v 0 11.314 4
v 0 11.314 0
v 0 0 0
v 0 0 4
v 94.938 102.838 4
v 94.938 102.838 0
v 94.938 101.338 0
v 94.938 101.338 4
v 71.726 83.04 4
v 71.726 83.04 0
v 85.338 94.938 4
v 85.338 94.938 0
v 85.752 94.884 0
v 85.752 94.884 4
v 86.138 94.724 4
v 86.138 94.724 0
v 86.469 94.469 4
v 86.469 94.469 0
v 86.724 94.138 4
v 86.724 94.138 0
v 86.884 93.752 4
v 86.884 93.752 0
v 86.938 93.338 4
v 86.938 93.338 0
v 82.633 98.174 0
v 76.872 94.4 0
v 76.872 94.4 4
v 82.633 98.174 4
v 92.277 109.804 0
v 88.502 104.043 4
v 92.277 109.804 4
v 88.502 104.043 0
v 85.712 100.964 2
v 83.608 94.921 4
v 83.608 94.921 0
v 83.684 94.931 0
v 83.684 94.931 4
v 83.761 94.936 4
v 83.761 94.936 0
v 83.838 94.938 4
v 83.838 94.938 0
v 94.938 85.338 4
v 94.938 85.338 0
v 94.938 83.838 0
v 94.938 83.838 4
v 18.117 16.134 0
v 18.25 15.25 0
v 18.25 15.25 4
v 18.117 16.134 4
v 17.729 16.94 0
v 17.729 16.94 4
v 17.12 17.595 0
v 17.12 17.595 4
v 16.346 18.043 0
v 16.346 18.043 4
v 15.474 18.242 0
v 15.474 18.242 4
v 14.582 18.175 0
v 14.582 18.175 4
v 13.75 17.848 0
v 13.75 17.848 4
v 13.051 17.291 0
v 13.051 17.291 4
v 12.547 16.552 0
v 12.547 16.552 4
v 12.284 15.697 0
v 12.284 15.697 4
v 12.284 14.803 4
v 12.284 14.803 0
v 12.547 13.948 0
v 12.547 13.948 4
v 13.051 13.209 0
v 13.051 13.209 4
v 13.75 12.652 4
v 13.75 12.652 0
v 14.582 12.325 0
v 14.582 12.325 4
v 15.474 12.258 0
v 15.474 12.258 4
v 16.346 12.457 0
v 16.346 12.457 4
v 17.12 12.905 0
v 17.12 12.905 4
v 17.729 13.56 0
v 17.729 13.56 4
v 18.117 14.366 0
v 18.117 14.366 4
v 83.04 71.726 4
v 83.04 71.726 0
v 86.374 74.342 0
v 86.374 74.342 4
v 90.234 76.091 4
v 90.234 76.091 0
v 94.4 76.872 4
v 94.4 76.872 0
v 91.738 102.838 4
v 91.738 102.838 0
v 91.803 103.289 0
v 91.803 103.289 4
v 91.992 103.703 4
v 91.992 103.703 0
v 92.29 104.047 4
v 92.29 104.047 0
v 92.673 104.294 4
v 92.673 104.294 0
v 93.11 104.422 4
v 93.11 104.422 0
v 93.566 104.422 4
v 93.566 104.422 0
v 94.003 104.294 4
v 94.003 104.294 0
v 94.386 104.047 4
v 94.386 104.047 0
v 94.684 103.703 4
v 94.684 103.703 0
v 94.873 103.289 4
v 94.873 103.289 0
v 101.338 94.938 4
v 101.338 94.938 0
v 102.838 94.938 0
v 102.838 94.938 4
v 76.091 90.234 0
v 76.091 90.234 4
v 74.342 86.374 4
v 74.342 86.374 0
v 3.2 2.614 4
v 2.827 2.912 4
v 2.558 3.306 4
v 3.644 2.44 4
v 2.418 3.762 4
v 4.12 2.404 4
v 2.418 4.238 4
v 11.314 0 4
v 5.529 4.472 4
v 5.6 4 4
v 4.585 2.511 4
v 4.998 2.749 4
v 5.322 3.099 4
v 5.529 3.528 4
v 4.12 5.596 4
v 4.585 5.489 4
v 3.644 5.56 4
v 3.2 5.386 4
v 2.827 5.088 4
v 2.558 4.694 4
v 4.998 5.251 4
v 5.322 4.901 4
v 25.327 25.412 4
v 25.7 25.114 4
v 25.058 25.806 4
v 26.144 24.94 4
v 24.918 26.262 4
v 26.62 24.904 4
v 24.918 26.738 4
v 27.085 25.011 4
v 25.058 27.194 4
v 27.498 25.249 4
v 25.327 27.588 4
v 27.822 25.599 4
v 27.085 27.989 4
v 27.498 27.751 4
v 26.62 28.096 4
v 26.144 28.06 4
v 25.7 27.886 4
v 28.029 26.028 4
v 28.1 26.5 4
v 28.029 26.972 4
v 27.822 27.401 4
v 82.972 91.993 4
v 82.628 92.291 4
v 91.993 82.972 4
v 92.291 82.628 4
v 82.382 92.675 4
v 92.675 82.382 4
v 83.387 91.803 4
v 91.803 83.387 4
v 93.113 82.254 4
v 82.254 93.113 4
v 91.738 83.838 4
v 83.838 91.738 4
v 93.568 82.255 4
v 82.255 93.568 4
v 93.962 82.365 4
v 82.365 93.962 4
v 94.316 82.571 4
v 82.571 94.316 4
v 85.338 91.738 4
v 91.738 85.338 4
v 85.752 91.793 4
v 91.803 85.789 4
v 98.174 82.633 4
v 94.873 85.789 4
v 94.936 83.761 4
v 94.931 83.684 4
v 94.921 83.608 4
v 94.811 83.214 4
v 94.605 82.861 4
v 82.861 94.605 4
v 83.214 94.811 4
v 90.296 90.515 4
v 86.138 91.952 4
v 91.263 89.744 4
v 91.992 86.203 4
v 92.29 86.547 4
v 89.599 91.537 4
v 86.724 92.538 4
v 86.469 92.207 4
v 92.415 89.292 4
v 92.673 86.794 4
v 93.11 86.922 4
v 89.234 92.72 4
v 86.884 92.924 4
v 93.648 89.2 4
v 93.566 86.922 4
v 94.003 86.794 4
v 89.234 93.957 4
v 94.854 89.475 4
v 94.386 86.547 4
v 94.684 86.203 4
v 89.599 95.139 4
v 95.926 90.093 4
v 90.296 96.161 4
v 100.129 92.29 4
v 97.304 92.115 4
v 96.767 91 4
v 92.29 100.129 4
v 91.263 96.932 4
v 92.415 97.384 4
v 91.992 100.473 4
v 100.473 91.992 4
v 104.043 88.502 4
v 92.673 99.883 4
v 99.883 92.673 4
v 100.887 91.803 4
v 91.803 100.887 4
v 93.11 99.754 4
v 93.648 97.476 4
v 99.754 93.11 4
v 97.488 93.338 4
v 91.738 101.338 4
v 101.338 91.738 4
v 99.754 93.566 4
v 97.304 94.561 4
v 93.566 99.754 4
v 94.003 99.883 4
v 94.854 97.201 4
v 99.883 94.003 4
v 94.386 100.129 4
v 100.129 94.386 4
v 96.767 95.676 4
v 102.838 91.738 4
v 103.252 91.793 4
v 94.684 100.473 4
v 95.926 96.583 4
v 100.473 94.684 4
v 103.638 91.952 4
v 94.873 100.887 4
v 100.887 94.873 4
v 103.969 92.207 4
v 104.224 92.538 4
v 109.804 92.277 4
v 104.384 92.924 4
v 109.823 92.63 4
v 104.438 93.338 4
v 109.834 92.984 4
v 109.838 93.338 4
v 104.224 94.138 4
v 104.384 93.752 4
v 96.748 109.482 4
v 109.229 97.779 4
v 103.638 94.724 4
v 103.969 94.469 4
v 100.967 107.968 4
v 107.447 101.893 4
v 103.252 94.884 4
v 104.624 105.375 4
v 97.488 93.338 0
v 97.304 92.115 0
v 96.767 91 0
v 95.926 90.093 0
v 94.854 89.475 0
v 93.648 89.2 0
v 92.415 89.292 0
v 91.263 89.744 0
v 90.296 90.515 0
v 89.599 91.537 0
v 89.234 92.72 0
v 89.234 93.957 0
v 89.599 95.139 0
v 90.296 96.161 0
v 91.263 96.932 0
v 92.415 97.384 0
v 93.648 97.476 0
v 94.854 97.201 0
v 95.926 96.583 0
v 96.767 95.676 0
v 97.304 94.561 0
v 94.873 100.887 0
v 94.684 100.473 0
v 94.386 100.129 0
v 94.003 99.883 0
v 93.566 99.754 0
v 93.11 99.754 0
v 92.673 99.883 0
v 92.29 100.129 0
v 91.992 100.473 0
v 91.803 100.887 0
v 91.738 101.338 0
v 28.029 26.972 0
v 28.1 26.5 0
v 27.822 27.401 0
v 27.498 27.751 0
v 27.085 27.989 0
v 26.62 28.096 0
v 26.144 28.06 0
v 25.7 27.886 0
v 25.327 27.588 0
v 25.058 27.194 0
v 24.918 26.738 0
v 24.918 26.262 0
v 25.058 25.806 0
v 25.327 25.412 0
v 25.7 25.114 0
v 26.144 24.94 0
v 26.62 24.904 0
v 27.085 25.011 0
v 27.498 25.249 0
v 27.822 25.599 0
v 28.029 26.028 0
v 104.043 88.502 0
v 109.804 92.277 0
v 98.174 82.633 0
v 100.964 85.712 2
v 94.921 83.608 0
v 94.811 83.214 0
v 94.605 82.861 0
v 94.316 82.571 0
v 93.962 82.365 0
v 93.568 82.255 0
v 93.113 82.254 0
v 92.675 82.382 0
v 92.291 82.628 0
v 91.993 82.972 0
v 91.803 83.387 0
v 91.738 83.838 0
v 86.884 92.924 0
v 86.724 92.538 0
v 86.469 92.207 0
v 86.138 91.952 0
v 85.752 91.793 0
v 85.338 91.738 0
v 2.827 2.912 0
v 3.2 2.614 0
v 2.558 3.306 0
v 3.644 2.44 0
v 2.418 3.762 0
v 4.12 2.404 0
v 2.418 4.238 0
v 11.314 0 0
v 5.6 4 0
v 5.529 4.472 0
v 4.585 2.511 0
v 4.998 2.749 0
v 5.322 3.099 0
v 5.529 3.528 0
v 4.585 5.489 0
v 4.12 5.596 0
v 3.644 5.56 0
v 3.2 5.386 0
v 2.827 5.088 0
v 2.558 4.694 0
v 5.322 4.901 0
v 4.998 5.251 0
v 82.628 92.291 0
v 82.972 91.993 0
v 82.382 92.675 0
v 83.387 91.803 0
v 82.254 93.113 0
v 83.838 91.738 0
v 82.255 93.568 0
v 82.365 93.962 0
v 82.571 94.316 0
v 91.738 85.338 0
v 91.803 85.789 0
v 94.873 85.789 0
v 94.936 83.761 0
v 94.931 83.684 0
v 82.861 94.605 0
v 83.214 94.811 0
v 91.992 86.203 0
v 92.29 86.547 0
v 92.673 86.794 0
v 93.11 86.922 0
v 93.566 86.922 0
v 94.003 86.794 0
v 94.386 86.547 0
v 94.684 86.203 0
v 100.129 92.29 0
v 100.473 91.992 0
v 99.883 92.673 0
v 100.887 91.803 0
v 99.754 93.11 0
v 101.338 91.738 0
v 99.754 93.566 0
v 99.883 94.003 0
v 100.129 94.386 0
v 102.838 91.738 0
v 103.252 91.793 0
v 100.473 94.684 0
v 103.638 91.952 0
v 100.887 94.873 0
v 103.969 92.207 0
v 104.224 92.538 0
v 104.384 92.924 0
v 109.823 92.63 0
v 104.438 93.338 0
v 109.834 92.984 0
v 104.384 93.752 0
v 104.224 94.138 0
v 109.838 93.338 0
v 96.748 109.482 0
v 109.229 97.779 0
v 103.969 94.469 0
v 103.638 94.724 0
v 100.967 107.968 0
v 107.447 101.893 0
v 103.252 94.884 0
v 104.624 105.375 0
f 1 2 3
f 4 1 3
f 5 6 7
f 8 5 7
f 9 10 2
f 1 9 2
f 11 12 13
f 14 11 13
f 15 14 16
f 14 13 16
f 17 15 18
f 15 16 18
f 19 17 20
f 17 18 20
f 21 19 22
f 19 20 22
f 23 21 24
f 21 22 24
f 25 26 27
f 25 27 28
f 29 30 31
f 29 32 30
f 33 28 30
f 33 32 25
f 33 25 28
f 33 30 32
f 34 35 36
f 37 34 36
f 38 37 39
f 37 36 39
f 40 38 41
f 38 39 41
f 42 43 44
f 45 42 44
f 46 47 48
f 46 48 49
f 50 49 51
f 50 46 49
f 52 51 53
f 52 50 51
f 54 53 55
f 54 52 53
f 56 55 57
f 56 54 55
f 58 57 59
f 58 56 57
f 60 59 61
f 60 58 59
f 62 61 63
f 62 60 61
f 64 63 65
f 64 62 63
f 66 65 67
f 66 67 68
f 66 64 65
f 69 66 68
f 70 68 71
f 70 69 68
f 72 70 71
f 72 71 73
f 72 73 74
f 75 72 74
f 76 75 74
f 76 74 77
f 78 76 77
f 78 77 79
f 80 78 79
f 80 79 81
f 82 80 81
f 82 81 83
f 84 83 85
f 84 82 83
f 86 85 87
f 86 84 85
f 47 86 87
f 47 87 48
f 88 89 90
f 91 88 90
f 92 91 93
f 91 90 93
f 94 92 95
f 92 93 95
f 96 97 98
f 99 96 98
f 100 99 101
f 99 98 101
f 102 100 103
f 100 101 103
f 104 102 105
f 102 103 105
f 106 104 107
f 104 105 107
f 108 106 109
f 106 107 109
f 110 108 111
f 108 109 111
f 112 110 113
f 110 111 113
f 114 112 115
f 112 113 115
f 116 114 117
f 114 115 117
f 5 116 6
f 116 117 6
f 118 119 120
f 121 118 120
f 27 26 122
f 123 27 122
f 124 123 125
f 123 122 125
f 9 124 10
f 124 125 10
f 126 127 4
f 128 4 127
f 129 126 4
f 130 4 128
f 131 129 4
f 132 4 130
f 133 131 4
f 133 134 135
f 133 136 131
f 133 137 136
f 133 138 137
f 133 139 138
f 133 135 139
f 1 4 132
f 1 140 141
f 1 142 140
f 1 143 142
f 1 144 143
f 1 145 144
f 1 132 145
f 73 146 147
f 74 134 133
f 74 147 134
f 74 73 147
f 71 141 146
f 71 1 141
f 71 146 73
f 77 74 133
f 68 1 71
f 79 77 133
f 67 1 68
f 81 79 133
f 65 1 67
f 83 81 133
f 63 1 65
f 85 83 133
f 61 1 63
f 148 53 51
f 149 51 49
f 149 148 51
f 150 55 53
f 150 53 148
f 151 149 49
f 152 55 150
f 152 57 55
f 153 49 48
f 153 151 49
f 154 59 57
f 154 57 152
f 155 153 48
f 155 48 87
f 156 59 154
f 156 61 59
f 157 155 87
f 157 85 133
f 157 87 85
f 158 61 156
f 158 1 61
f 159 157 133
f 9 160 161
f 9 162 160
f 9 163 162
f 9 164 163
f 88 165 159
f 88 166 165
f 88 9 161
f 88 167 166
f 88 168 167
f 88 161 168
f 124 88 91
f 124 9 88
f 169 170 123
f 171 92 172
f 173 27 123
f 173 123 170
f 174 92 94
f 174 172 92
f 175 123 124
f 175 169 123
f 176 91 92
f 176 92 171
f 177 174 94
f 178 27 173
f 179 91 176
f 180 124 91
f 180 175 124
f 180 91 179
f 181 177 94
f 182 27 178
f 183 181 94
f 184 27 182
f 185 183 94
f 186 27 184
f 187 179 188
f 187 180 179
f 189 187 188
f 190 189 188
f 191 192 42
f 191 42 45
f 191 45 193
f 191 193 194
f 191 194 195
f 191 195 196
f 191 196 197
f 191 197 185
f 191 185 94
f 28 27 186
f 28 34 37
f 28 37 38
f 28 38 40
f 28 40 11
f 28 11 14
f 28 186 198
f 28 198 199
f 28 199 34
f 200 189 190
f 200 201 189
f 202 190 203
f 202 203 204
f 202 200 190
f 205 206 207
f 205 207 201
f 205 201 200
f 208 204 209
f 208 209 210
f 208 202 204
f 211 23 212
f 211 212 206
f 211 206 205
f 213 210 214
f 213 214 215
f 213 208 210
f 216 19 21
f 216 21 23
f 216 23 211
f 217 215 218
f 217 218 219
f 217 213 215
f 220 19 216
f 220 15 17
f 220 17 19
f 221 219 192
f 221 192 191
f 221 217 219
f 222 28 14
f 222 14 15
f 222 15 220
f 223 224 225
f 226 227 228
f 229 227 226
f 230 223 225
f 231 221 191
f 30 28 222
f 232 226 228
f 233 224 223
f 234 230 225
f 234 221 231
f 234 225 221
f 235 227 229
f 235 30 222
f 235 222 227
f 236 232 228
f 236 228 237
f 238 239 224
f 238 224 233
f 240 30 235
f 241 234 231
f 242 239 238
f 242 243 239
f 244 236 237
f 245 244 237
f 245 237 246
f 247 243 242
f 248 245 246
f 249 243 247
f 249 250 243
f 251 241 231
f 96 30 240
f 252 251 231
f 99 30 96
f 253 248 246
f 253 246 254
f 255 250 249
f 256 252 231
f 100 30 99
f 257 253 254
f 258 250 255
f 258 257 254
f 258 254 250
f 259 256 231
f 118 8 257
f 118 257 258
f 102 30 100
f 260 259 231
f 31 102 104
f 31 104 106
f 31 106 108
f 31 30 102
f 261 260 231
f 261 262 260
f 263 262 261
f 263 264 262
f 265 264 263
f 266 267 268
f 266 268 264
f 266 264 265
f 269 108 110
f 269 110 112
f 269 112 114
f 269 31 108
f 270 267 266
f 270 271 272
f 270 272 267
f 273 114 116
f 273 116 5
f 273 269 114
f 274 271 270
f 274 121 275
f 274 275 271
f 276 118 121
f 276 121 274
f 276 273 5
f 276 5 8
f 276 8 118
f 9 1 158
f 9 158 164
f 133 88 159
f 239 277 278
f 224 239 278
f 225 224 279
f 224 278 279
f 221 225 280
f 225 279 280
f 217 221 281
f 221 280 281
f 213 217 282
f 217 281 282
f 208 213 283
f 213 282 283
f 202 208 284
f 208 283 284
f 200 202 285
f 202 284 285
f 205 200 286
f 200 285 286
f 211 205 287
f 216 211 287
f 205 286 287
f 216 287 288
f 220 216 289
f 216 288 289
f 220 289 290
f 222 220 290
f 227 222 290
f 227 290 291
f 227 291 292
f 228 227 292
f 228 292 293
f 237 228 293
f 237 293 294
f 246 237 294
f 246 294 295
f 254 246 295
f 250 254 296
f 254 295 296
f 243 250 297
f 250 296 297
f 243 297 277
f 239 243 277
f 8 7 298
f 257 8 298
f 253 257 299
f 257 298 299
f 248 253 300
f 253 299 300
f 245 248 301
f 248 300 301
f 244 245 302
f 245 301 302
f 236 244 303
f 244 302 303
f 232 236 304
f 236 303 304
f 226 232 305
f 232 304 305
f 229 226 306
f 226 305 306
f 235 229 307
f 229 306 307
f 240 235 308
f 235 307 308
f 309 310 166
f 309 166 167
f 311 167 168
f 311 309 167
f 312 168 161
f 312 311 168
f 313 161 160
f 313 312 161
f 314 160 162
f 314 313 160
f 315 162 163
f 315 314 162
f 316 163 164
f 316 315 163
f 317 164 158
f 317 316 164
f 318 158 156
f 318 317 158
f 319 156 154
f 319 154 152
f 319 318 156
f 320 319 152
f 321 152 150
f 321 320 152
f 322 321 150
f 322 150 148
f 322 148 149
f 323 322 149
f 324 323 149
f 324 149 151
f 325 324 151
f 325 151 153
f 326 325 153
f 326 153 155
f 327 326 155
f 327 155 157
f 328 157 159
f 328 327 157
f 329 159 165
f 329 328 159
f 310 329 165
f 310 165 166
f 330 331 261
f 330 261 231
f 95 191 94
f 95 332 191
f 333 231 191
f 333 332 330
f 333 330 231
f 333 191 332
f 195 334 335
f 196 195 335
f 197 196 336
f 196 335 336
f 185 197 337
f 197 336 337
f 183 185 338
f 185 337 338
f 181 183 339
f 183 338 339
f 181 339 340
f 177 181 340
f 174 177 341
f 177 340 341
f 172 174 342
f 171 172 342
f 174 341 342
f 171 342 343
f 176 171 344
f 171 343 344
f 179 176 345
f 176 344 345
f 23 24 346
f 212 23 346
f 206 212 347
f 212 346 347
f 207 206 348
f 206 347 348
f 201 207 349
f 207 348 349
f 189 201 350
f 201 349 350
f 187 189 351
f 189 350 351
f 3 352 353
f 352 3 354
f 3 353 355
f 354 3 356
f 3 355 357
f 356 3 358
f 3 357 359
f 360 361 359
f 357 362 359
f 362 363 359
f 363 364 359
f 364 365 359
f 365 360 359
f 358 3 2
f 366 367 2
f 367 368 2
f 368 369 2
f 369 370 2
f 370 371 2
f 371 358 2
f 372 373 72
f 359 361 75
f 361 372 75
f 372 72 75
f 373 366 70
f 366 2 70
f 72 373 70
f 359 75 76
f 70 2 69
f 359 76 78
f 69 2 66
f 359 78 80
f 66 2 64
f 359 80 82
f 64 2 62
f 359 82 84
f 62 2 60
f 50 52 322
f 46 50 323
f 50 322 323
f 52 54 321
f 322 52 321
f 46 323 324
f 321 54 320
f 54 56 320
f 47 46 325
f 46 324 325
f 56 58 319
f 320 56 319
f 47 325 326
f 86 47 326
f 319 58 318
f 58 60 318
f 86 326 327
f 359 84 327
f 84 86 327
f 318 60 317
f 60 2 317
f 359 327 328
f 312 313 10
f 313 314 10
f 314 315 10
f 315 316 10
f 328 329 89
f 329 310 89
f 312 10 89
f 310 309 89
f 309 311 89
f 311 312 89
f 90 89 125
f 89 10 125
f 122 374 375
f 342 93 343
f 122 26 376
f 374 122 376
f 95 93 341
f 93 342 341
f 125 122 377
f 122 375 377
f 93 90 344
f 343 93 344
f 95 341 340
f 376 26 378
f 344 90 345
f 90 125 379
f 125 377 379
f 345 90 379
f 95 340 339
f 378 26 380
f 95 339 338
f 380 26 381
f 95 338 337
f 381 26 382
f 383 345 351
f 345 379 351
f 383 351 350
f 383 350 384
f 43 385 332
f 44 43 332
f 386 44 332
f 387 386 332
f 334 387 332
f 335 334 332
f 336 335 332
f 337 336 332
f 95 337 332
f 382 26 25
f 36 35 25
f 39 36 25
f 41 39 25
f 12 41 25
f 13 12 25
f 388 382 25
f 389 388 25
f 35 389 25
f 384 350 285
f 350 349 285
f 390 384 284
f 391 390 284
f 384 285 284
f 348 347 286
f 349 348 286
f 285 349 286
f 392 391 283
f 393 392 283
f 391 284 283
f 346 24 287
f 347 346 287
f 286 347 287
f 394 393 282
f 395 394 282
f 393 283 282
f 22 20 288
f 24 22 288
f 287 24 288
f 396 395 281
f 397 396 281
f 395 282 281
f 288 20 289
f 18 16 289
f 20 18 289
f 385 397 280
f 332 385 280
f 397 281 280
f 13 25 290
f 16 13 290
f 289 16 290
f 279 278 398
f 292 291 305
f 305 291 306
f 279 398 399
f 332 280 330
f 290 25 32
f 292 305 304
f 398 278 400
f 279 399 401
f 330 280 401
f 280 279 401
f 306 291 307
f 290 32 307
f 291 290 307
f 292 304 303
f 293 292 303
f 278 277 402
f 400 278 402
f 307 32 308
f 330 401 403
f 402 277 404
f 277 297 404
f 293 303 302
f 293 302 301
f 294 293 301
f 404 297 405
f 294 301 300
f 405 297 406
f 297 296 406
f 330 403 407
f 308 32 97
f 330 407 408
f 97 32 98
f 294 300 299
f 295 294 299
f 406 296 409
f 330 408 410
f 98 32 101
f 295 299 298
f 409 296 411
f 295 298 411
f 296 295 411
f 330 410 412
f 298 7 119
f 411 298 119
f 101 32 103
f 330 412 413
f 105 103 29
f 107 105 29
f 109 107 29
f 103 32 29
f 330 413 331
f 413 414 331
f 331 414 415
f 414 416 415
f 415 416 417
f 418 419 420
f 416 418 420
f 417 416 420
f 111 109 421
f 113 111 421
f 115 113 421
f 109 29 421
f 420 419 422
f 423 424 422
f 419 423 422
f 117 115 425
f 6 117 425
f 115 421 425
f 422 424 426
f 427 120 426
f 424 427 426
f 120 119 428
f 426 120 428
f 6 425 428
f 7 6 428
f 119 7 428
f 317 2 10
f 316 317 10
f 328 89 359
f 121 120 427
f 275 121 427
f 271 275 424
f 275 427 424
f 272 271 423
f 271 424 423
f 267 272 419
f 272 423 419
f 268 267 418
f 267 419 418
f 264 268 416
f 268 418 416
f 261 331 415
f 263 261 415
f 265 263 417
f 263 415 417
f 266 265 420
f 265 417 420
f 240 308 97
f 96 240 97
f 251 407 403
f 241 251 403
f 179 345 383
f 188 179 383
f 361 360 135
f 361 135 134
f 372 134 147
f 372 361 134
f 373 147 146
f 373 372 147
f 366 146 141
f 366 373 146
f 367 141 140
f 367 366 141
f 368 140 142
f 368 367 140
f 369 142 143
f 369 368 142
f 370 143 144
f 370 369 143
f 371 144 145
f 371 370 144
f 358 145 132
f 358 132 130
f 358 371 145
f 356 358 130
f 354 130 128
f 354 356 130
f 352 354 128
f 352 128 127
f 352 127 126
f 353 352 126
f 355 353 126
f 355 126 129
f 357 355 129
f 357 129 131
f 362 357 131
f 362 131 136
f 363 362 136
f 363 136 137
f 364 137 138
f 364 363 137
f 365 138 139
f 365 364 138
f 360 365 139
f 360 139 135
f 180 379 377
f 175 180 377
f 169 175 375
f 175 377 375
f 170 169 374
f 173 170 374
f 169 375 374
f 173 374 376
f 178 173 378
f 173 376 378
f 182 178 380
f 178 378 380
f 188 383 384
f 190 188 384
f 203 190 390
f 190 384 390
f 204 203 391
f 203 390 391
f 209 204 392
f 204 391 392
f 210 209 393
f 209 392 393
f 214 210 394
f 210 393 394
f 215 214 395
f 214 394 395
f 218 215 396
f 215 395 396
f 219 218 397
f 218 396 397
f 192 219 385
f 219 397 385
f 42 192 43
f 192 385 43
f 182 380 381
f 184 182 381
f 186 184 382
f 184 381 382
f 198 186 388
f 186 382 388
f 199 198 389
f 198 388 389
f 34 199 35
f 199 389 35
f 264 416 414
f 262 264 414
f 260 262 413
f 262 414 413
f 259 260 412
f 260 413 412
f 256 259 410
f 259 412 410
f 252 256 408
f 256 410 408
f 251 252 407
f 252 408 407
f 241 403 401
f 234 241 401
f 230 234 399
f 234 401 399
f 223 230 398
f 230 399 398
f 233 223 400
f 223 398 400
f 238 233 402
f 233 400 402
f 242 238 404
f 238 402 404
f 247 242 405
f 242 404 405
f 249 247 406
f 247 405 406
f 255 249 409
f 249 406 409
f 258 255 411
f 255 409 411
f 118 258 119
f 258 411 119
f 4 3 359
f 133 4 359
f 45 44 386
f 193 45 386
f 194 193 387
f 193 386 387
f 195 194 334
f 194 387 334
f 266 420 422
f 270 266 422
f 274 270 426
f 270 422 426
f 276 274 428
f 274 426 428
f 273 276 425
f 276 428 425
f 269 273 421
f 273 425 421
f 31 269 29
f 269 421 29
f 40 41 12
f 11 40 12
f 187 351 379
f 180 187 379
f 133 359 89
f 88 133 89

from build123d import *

# Parameters (mm, degrees)
F0_R        = 1.6
F0_R_2      = 3
F1_DEPTH    = 4
F2_T1_DEPTH = 4


# Not quite as in the source:
# - a fillet or chamfer that OpenCascade refuses, or shapes differently, is made with other operations: its cross-section is extruded or revolved along the edge and cut away or added


with BuildPart() as f1:
    # F0 (on Top) → F1 (new body)
    with BuildSketch(Plane.XY):
        with BuildLine():
            ThreePointArc((88.7907835501, 77.4770750512), (81.670833227, 81.670833227), (77.4770750512, 88.7907835501))
            Line((77.4770750512, 88.7907835501), (0, 11.313708499))
            Line((0, 11.313708499), (0, 0))
            Line((0, 0), (11.313708499, 0))
            Line((11.313708499, 0), (88.7907835501, 77.4770750512))
        make_face()
        with Locations((4, 4)):
            Circle(F0_R, mode=Mode.SUBTRACT)
        with Locations((15.25, 15.25)):
            Circle(F0_R_2, mode=Mode.SUBTRACT)
        with Locations((26.499998178, 26.499998178)):
            Circle(F0_R, mode=Mode.SUBTRACT)
        with BuildLine():
            ThreePointArc((96.2725882585, 90.4036019747), (90.4036019747, 90.4036019747), (90.4036019747, 96.2725882585))
            Line((90.4036019747, 96.2725882585), (87.6812408671, 98.9949493661))
            Line((87.6812408671, 98.9949493661), (83.6077136088, 94.9214221078))
            ThreePointArc((83.6077136088, 94.9214221078), (83.7226030948, 94.9339214207), (83.8380951166, 94.9380951166))
            Line((83.8380951166, 94.9380951166), (85.3380951166, 94.9380951166))
            ThreePointArc((85.3380951166, 94.9380951166), (86.4694659665, 94.4694659665), (86.9380951166, 93.3380951166))
            ThreePointArc((86.9380951166, 93.3380951166), (86.4694659665, 92.2067242667), (85.3380951166, 91.7380951166))
            Line((85.3380951166, 91.7380951166), (83.8380951166, 91.7380951166))
            ThreePointArc((83.8380951166, 91.7380951166), (82.6280103236, 92.2913407072), (82.2547681255, 93.5684766245))
            Line((82.2547681255, 93.5684766245), (77.4770750512, 88.7907835501))
            ThreePointArc((77.4770750512, 88.7907835501), (81.670833227, 81.670833227), (88.7907835501, 77.4770750512))
            Line((88.7907835501, 77.4770750512), (93.5684766245, 82.2547681255))
            ThreePointArc((93.5684766245, 82.2547681255), (92.2913407072, 82.6280103236), (91.7380951166, 83.8380951166))
            Line((91.7380951166, 83.8380951166), (91.7380951166, 85.3380951166))
            ThreePointArc((91.7380951166, 85.3380951166), (93.3380951166, 86.9380951166), (94.9380951166, 85.3380951166))
            Line((94.9380951166, 85.3380951166), (94.9380951166, 83.8380951166))
            ThreePointArc((94.9380951166, 83.8380951166), (94.9339214207, 83.7226030948), (94.9214221078, 83.6077136088))
            Line((94.9214221078, 83.6077136088), (98.9949493661, 87.6812408671))
            Line((98.9949493661, 87.6812408671), (96.2725882585, 90.4036019747))
        make_face()
        with BuildLine():
            Line((87.6812408671, 98.9949493661), (90.4036019747, 96.2725882585))
            ThreePointArc((90.4036019747, 96.2725882585), (94.9262313609, 97.1721951765), (97.4880951166, 93.3380951166))
            ThreePointArc((97.4880951166, 93.3380951166), (97.1721951765, 91.7499588723), (96.2725882585, 90.4036019747))
            Line((96.2725882585, 90.4036019747), (98.9949493661, 87.6812408671))
            Line((98.9949493661, 87.6812408671), (94.9214221078, 83.6077136088))
            ThreePointArc((94.9214221078, 83.6077136088), (94.4694659665, 82.7067242667), (93.5684766245, 82.2547681255))
            Line((93.5684766245, 82.2547681255), (88.7907835501, 77.4770750512))
            ThreePointArc((88.7907835501, 77.4770750512), (91.5691380282, 76.9331936899), (94.3995707365, 76.8722738645))
            add(Edge.make_bspline(
                [(109.8039163688, 92.2766194967), (99.380066986, 87.2961232472), (94.3995707365, 76.8722738645)],
                knots=[3.9431649716, 3.9431649716, 3.9431649716, 5.4816129892, 5.4816129892, 5.4816129892], degree=2, weights=[1, 0.7184506482, 1]))
            ThreePointArc((109.8039163688, 92.2766194968), (109.829548216, 92.8070822452), (109.8380951166, 93.3380951166))
            ThreePointArc((109.8380951166, 93.3380951166), (104.6238306326, 105.3747962371), (92.2766194968, 109.8039163688))
            add(Edge.make_bspline(
                [(76.8722738645, 94.3995707365), (87.2961232472, 99.380066986), (92.2766194967, 109.8039163688)],
                knots=[0.801572318, 0.801572318, 0.801572318, 2.3400203356, 2.3400203356, 2.3400203356], degree=2, weights=[1, 0.7184506482, 1]))
            ThreePointArc((76.8722738645, 94.3995707365), (76.9331936899, 91.5691380282), (77.4770750512, 88.7907835501))
            Line((77.4770750512, 88.7907835501), (82.2547681255, 93.5684766245))
            ThreePointArc((82.2547681255, 93.5684766245), (82.7067242667, 94.4694659665), (83.6077136088, 94.9214221078))
            Line((83.6077136088, 94.9214221078), (87.6812408671, 98.9949493661))
        make_face()
        with BuildLine():
            ThreePointArc((104.4380951166, 93.3380951166), (103.9694659665, 92.2067242667), (102.8380951166, 91.7380951166))
            Line((102.8380951166, 91.7380951166), (101.3380951166, 91.7380951166))
            ThreePointArc((101.3380951166, 91.7380951166), (99.7380951166, 93.3380951166), (101.3380951166, 94.9380951166))
            Line((101.3380951166, 94.9380951166), (102.8380951166, 94.9380951166))
            ThreePointArc((102.8380951166, 94.9380951166), (103.9694659665, 94.4694659665), (104.4380951166, 93.3380951166))
        make_face(mode=Mode.SUBTRACT)
        with BuildLine():
            Line((91.7380951166, 101.3380951166), (91.7380951166, 102.8380951166))
            ThreePointArc((91.7380951166, 102.8380951166), (93.3380951166, 104.4380951166), (94.9380951166, 102.8380951166))
            Line((94.9380951166, 102.8380951166), (94.9380951166, 101.3380951166))
            ThreePointArc((94.9380951166, 101.3380951166), (93.3380951166, 99.7380951166), (91.7380951166, 101.3380951166))
        make_face(mode=Mode.SUBTRACT)
    extrude(amount=F1_DEPTH)

    # F2: fillet of radius 17.7 on 2 edges, made by hand

    # F2_s2 → F2_t1 (join)
    with BuildSketch(Plane.XY):
        with BuildLine():
            ThreePointArc((83.0395470443, 71.7258385453), (88.2512757036, 75.3327247086), (94.3995707365, 76.8722738645))
            ThreePointArc((94.3995707365, 76.8722738645), (91.5691380282, 76.9331936899), (88.7907835501, 77.4770750512))
            Line((88.7907835501, 77.4770750512), (83.0395470443, 71.7258385453))
        make_face()
        with BuildLine():
            ThreePointArc((76.8722738645, 94.3995707365), (75.3327247086, 88.2512757036), (71.7258385453, 83.0395470443))
            Line((71.7258385453, 83.0395470443), (77.4770750512, 88.7907835501))
            ThreePointArc((77.4770750512, 88.7907835501), (76.9331936899, 91.5691380282), (76.8722738645, 94.3995707365))
        make_face()
    extrude(amount=F2_T1_DEPTH)


solid = f1.part
